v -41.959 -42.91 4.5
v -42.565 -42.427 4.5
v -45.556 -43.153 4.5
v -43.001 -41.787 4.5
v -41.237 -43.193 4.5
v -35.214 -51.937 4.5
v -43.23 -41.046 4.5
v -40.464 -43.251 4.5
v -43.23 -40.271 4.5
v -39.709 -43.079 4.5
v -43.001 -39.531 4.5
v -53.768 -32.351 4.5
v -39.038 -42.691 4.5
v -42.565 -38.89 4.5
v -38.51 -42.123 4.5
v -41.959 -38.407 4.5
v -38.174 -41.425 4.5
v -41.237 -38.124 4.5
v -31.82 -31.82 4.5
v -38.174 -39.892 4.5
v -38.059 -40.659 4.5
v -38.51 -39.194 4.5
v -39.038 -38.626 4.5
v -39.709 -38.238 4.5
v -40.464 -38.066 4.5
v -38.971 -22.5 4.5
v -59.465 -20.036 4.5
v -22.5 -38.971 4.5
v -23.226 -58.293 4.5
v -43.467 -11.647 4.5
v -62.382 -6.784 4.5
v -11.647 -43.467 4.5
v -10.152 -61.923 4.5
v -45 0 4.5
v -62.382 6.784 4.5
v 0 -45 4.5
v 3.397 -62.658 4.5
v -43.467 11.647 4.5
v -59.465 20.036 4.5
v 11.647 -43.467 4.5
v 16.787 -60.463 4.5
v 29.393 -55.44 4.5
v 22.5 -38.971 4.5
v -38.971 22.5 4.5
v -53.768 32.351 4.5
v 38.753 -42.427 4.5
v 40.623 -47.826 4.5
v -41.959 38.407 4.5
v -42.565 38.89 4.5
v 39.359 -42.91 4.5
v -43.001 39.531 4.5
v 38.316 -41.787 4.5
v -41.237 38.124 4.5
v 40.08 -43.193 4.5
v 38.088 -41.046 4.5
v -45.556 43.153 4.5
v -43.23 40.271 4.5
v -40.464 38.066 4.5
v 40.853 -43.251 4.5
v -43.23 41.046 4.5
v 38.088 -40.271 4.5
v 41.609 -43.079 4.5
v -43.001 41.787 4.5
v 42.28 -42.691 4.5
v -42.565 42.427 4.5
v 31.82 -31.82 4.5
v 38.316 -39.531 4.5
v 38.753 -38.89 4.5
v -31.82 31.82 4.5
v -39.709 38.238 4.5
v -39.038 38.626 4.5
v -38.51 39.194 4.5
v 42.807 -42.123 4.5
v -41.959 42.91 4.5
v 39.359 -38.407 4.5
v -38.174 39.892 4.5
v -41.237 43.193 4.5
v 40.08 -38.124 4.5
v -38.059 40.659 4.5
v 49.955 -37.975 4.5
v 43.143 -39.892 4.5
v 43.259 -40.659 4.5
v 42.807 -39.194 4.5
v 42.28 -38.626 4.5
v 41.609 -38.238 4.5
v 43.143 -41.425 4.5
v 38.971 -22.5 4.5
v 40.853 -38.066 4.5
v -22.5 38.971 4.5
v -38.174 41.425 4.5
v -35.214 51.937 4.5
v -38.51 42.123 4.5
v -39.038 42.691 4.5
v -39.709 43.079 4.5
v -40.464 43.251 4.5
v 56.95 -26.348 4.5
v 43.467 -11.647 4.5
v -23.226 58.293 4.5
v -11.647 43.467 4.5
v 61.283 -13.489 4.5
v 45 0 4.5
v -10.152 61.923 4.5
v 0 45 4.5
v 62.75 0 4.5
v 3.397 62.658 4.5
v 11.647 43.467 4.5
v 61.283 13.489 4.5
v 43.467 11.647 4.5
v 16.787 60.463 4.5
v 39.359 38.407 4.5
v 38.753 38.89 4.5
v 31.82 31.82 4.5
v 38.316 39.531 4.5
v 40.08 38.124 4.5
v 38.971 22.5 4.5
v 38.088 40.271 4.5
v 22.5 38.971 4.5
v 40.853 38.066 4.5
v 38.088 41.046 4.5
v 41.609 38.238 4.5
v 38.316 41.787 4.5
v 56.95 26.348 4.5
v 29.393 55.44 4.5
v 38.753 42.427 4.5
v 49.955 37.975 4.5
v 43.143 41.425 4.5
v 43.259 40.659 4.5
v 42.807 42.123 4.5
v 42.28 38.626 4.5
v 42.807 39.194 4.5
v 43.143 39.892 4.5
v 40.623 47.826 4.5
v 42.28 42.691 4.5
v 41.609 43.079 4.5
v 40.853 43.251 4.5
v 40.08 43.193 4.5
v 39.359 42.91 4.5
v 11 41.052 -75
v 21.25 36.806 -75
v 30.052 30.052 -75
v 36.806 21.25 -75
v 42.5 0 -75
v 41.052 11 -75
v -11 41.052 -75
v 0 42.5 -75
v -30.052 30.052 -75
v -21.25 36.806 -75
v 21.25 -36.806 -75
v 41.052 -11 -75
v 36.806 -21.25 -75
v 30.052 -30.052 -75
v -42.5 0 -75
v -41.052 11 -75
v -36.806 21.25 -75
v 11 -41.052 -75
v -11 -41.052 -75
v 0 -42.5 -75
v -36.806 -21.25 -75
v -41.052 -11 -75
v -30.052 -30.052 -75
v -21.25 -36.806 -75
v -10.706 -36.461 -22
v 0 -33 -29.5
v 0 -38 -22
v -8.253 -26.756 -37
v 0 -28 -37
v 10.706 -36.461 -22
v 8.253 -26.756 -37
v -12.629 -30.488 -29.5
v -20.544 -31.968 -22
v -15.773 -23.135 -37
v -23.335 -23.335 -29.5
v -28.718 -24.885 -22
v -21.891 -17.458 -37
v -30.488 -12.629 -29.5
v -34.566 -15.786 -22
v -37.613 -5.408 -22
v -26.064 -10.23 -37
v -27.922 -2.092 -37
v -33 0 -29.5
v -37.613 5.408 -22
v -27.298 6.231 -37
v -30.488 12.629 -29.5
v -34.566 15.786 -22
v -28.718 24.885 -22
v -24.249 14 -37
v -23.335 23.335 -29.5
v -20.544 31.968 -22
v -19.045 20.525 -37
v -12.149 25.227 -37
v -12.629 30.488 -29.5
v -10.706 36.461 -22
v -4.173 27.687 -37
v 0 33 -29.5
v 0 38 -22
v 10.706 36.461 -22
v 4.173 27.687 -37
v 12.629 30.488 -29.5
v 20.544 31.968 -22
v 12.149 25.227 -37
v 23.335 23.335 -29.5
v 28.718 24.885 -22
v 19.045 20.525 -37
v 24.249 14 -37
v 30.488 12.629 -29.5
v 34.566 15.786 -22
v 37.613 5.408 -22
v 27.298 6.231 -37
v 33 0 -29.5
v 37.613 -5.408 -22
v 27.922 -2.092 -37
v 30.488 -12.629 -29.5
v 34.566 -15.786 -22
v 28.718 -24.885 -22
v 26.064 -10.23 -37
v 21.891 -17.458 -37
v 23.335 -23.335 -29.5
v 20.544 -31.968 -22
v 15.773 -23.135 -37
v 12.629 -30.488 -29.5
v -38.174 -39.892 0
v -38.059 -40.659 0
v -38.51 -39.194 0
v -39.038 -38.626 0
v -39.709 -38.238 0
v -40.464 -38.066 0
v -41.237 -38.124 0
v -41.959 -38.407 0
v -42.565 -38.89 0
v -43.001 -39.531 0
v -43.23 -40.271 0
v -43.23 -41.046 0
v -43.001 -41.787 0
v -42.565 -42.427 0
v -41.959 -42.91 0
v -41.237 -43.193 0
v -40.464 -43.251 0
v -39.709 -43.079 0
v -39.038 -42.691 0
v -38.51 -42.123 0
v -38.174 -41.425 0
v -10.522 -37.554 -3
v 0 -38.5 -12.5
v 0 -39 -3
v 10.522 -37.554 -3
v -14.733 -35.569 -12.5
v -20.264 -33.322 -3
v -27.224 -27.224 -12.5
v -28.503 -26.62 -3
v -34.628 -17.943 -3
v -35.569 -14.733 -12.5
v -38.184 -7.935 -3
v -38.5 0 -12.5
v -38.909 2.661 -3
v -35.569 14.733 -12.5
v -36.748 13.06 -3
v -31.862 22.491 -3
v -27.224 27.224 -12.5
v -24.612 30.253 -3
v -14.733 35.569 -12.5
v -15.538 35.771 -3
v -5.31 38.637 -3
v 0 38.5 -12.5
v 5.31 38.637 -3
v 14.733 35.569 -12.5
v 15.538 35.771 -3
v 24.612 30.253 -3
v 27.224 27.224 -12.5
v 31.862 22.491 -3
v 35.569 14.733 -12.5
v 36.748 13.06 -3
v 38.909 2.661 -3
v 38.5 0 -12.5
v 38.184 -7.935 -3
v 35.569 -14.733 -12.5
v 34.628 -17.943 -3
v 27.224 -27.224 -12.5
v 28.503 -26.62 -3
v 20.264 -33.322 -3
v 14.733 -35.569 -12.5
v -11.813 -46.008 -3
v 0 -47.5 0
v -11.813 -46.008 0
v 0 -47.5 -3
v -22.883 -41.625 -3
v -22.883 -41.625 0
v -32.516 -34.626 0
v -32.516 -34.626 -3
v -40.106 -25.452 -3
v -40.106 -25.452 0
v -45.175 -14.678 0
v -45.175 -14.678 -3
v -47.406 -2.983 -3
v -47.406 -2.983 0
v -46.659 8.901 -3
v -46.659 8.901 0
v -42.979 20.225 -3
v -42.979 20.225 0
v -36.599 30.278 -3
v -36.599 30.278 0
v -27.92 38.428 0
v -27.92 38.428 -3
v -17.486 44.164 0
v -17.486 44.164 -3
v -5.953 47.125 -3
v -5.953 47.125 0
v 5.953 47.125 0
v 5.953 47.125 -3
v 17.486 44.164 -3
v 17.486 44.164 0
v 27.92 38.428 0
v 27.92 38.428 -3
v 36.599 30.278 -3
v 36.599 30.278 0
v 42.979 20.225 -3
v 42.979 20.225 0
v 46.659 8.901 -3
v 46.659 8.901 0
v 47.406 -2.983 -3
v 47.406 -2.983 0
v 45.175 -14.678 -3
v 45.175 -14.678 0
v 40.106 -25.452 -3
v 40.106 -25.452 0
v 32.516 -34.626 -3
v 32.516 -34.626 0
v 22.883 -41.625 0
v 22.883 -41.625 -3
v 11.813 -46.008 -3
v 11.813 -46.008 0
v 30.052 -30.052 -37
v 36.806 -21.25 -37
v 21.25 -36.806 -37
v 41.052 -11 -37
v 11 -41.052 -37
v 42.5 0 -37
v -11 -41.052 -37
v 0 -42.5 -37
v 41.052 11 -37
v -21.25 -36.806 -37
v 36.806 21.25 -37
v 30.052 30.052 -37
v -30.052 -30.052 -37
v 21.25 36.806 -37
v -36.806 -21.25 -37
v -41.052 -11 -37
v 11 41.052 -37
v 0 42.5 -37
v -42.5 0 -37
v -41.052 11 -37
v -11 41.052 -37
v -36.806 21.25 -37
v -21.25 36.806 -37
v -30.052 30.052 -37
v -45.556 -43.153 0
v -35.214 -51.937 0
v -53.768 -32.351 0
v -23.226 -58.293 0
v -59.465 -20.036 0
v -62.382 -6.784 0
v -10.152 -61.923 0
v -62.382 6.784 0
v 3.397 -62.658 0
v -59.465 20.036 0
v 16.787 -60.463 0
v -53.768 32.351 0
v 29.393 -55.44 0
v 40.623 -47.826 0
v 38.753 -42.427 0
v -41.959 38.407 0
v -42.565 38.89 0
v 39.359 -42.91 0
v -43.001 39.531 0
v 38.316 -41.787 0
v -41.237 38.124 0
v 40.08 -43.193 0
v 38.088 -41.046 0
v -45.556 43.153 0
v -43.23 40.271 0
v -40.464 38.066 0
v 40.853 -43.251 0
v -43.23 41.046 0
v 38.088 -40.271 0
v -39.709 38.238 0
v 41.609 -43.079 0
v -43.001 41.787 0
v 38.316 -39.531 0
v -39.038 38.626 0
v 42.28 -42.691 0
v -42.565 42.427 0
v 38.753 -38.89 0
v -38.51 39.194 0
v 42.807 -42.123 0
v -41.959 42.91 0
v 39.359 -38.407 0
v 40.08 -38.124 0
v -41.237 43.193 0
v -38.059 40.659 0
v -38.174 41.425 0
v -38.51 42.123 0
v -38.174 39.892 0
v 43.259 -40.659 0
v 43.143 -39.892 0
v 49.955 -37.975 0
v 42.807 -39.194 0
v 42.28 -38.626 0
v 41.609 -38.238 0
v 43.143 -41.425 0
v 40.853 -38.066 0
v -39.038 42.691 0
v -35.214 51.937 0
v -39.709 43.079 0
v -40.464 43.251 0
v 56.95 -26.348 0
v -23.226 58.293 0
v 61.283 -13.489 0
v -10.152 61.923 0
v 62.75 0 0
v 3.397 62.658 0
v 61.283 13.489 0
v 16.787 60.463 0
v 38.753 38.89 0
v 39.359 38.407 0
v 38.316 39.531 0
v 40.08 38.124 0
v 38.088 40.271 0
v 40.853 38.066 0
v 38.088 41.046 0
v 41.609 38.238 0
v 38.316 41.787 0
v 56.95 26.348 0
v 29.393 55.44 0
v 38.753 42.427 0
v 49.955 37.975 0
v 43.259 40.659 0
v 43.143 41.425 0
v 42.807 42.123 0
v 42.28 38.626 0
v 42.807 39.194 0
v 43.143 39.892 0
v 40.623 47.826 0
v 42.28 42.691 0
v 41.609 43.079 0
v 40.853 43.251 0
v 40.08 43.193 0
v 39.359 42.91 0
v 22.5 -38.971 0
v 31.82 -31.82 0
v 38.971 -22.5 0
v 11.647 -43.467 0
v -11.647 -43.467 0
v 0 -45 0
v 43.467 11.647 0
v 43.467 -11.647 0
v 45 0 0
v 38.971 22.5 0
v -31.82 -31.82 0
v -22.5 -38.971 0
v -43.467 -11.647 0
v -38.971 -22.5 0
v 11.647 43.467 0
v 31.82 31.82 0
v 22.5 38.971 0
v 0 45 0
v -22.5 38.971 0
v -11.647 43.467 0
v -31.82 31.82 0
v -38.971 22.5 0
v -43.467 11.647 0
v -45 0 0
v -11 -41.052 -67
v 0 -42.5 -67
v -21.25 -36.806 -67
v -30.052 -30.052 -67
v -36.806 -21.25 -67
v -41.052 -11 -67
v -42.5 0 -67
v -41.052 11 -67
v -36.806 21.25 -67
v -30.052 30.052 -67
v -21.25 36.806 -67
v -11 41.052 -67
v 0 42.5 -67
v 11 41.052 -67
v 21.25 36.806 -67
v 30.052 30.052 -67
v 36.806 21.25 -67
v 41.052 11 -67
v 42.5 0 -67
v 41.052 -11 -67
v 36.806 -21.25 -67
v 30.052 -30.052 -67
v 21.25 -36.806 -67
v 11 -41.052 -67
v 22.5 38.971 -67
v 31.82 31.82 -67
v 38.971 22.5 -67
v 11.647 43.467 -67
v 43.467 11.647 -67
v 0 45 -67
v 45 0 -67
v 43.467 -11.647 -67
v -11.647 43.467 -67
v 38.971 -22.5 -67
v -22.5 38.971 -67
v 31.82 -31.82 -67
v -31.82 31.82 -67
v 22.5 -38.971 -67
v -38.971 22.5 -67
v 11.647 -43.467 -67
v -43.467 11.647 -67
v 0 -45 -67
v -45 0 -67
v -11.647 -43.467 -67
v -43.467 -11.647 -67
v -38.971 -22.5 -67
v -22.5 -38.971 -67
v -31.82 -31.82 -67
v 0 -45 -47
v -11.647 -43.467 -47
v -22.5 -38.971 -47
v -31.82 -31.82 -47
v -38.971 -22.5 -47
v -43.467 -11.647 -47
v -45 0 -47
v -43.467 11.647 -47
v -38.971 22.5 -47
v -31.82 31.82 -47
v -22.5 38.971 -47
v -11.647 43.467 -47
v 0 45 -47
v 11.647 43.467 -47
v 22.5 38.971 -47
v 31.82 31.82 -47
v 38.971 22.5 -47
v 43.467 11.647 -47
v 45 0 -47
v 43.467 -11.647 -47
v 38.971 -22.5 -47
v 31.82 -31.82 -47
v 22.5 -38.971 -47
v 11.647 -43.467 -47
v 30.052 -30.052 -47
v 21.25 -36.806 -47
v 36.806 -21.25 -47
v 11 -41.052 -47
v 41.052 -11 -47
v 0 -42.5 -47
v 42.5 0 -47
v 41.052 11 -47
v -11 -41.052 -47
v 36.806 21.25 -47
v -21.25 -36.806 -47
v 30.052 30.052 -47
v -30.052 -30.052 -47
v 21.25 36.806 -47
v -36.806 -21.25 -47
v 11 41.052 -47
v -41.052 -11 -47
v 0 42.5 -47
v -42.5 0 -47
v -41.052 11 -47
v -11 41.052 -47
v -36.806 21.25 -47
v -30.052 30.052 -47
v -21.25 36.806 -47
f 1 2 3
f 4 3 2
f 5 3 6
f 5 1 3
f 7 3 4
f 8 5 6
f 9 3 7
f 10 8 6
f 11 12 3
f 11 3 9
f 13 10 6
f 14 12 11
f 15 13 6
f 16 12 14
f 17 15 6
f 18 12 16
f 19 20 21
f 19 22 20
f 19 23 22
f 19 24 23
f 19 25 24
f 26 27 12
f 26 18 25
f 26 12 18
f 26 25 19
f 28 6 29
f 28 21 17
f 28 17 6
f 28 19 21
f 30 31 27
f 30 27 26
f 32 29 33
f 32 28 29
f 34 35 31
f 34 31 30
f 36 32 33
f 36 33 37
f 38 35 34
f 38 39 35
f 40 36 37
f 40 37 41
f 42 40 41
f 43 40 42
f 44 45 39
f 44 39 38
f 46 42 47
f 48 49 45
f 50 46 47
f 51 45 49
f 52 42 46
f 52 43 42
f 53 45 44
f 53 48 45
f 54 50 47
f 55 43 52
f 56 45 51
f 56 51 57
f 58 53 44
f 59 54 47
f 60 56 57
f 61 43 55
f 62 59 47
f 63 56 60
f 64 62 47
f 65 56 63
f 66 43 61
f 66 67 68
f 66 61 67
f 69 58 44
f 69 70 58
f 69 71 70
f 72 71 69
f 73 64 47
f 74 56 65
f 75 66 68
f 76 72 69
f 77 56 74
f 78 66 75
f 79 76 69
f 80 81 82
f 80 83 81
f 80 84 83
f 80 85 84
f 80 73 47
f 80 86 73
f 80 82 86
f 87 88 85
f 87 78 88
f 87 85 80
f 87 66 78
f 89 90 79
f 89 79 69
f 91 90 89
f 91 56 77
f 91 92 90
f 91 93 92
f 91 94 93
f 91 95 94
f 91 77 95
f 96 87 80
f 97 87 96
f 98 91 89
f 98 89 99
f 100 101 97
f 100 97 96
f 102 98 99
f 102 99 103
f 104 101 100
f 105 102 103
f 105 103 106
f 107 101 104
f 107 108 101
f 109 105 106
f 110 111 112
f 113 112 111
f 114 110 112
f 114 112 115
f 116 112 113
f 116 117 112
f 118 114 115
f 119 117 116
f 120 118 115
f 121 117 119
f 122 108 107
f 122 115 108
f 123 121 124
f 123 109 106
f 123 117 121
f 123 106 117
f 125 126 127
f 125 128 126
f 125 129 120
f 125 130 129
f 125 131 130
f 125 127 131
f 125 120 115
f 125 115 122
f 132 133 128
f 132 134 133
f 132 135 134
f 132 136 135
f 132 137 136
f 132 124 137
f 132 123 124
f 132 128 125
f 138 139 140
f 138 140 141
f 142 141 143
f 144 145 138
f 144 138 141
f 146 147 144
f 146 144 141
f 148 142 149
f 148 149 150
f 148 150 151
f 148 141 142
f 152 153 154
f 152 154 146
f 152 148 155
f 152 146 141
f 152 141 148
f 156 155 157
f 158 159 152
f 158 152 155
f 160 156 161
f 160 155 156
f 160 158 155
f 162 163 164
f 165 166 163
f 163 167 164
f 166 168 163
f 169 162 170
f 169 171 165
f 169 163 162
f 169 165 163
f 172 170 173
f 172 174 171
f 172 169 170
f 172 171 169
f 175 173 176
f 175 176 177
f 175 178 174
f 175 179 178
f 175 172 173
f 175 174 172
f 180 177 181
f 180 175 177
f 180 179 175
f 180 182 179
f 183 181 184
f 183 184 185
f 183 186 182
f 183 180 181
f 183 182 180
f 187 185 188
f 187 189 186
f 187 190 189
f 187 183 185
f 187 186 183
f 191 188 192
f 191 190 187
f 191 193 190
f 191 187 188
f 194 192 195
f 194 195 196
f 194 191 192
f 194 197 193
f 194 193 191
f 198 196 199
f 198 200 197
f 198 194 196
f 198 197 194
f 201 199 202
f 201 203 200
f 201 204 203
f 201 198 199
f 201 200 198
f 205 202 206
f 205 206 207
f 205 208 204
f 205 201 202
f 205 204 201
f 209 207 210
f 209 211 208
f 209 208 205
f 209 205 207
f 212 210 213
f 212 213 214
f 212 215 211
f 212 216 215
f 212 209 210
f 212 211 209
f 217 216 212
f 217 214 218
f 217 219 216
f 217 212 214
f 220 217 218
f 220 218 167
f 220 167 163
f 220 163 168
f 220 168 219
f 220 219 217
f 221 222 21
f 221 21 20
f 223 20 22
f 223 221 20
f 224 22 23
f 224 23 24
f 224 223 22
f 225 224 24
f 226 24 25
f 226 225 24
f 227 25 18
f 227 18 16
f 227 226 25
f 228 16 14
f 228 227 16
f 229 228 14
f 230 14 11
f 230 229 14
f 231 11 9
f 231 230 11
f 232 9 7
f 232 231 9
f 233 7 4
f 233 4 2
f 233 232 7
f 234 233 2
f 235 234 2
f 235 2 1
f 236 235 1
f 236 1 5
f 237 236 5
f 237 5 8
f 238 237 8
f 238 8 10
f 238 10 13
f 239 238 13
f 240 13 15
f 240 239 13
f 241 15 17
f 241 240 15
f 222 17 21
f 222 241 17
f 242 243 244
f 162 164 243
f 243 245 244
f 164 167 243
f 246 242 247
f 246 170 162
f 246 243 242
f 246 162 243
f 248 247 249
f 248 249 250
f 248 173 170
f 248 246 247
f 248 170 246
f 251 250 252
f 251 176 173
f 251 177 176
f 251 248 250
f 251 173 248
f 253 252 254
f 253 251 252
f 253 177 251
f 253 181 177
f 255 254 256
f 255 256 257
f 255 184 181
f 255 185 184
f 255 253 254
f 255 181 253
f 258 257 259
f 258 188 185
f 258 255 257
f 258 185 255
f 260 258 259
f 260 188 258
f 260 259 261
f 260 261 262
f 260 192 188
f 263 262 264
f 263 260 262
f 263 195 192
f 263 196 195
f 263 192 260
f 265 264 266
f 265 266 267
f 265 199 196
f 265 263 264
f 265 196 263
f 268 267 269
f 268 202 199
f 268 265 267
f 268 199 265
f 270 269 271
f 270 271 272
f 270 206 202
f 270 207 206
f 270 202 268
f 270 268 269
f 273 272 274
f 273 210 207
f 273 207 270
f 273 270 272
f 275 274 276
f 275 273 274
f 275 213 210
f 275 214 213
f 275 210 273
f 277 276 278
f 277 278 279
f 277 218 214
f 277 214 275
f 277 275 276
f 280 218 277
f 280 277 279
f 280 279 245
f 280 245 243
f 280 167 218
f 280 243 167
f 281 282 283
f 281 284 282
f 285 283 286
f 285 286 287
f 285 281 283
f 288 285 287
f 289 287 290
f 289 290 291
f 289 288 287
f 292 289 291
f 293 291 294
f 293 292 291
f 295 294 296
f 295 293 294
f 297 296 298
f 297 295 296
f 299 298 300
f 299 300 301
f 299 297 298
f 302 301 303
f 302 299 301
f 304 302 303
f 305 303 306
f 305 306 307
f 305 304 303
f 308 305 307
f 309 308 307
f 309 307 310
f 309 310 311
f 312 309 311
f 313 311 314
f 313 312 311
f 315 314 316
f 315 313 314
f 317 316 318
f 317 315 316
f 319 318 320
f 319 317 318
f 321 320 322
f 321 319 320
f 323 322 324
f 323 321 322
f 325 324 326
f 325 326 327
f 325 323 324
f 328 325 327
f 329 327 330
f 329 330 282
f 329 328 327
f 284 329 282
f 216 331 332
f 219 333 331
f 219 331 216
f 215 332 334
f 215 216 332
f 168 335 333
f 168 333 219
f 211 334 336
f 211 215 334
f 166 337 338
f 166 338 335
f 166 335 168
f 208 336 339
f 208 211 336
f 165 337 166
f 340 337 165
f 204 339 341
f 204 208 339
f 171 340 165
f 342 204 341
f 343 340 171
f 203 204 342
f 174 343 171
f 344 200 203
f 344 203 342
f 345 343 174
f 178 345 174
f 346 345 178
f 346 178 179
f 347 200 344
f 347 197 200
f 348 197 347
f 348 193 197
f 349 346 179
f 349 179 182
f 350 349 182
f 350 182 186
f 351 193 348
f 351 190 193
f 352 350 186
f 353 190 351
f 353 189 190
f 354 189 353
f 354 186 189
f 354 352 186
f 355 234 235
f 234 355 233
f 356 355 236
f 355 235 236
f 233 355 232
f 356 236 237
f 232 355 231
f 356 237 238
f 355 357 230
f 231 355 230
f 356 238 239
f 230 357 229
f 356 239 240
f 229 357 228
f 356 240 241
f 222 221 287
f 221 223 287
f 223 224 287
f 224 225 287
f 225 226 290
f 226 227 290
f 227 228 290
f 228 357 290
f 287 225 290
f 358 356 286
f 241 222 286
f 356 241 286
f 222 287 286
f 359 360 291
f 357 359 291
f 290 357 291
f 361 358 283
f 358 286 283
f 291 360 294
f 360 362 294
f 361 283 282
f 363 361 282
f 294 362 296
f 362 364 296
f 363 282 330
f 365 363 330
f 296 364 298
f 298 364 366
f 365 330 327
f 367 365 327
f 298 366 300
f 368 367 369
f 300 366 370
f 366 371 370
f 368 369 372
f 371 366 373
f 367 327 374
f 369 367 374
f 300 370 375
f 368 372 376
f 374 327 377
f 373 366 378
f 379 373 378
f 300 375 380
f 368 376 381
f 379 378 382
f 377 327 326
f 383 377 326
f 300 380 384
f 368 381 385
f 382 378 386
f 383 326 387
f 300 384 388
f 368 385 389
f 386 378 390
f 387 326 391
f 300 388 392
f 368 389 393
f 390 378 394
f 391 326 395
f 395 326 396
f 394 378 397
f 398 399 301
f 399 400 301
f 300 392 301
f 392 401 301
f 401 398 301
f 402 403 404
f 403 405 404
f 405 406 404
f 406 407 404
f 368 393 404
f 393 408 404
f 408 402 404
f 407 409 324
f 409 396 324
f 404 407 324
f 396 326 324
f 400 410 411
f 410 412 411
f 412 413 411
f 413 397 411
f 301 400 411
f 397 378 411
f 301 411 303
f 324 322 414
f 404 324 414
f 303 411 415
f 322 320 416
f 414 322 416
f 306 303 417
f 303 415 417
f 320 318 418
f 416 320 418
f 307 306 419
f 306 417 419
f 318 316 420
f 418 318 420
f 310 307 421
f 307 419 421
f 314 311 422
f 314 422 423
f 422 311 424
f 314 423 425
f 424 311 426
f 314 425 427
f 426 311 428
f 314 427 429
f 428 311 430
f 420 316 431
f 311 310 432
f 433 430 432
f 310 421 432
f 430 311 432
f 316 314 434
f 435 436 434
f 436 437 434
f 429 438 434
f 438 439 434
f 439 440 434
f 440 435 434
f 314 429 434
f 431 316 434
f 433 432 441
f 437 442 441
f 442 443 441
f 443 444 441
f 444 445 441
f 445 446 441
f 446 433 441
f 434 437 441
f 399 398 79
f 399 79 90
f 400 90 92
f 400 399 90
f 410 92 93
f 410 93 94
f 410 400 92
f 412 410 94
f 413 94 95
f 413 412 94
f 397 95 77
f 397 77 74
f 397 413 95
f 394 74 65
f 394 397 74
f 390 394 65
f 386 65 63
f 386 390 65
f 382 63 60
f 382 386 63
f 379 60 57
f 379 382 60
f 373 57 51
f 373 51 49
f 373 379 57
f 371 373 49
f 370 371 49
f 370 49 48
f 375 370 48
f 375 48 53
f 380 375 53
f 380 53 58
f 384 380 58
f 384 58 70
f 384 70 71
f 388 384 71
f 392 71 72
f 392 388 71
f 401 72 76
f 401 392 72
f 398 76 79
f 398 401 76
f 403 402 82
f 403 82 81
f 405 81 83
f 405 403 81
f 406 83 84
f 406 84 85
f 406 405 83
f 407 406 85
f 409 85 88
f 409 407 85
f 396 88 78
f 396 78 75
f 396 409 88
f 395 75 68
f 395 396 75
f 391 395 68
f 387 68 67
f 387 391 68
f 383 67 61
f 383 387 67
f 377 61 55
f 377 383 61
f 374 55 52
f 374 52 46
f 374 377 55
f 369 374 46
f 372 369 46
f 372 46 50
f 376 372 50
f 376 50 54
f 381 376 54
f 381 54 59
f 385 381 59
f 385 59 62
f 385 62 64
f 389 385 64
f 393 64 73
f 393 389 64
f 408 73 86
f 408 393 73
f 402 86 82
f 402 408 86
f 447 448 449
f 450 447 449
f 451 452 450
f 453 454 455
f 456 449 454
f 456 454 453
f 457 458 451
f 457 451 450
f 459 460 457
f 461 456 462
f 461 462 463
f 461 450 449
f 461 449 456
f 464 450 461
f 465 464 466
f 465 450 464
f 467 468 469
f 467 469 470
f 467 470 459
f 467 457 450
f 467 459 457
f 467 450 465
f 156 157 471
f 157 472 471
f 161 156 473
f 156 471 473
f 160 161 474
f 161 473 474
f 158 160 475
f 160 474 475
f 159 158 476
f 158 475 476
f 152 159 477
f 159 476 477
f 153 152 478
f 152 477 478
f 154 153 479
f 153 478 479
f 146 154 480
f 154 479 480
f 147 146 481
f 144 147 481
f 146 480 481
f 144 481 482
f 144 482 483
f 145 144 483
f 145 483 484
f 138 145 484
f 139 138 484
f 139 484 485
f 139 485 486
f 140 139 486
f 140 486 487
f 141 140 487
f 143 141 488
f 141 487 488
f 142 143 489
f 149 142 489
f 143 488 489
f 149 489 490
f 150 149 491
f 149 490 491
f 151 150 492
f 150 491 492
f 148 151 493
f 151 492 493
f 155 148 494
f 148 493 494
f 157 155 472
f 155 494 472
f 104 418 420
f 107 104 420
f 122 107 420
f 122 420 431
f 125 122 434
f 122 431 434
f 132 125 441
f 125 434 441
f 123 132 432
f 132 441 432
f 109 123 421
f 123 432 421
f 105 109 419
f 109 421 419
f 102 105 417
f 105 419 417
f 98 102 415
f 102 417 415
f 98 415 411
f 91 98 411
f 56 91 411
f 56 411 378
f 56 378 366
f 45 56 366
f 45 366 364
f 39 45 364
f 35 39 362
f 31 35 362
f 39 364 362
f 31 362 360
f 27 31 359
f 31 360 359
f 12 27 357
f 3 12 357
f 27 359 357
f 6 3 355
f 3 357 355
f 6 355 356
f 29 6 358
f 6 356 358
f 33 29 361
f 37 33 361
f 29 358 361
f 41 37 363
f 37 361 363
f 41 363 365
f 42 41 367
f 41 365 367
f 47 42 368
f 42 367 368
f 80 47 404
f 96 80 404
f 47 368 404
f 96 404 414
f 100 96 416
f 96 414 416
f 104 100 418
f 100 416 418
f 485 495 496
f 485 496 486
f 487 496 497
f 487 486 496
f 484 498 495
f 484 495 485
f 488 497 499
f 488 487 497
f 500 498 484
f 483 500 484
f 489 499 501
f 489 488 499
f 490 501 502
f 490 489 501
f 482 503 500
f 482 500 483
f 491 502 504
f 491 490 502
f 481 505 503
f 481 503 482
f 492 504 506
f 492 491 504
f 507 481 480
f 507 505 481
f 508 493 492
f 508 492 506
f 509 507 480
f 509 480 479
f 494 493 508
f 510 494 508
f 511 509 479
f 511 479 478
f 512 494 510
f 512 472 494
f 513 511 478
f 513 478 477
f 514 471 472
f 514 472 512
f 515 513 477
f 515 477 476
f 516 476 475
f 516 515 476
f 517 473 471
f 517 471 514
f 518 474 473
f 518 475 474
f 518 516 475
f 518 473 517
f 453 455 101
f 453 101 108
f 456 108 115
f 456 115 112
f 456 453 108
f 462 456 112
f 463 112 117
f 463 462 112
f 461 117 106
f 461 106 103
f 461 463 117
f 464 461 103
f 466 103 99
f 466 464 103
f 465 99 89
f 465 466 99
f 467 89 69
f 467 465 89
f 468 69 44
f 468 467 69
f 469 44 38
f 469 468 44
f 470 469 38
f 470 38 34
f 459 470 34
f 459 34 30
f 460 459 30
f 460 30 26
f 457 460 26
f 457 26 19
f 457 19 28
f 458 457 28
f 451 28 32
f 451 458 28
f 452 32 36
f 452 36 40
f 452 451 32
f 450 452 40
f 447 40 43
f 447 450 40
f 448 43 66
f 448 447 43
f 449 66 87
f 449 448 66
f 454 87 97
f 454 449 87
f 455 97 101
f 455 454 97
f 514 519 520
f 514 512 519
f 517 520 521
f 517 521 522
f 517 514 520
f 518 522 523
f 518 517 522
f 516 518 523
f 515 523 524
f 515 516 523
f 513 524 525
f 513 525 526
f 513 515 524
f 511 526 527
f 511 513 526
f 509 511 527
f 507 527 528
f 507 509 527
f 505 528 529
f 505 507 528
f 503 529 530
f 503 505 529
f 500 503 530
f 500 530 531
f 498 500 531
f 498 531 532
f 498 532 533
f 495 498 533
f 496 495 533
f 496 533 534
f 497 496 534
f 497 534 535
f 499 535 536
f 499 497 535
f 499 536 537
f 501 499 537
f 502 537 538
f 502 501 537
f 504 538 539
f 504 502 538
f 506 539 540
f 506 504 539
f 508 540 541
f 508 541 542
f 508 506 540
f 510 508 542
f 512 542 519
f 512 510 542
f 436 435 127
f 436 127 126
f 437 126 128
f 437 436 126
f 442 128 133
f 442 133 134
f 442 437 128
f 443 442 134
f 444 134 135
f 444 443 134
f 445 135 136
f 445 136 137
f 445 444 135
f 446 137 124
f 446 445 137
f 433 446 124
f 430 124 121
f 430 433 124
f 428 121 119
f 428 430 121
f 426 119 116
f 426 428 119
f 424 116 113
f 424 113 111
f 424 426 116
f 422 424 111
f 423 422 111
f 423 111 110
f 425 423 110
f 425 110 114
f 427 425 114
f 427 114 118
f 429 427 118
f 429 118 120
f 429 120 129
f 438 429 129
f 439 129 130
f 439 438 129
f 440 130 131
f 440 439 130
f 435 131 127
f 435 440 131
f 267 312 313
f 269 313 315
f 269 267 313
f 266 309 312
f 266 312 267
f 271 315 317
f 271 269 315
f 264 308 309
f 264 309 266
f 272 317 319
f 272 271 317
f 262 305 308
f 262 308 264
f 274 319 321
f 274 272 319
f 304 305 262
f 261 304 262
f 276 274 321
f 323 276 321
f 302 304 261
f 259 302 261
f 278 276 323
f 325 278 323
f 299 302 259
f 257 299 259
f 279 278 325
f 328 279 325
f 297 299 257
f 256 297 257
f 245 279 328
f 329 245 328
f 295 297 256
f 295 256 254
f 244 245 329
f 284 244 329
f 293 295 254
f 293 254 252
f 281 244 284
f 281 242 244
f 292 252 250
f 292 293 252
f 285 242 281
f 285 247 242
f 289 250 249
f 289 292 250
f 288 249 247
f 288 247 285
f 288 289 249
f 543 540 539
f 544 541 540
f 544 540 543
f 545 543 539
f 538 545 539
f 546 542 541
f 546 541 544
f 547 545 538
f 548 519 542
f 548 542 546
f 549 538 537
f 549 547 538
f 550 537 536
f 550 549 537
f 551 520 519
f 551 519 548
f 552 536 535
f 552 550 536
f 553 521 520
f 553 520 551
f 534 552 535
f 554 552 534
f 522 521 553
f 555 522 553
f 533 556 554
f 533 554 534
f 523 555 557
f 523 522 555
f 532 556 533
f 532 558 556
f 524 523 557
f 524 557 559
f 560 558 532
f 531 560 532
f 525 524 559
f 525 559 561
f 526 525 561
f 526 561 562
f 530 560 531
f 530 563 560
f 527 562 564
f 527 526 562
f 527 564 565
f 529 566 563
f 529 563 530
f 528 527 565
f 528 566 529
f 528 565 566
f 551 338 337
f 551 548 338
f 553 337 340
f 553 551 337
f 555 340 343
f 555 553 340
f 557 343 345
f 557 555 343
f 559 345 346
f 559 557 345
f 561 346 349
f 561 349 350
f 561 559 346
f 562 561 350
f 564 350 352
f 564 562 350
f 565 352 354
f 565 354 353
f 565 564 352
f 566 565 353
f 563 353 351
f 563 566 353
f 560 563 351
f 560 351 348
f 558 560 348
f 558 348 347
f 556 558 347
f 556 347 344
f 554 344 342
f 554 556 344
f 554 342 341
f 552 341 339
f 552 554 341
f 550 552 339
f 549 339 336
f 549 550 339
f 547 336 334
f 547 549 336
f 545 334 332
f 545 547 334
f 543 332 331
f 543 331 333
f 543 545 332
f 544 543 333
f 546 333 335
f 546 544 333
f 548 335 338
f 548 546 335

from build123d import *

# Parameters (mm, degrees)
F0_W     = 42.5
F0_H     = 8
F1_R     = 62.75
F1_R_2   = 2.6
F1_R_3   = 45
F3_DEPTH = 4.5


with BuildPart() as f2:
    # F0 (on Right) → F2 (revolve)
    with BuildSketch(Plane.YZ):
        Polygon((0, -37), (0, 0), (-47.5, 0), (-47.5, -3), (-39, -3), (-38, -22), (-28, -37), align=None)
        Polygon((0, -47), (0, -37), (-28, -37), (-42.5, -37), (-42.5, -47), align=None)
        Polygon((0, -67), (0, -47), (-42.5, -47), (-45, -47), (-45, -67), (-42.5, -67), align=None)
        with Locations((-21.25, -71)):
            Rectangle(F0_W, F0_H)
    revolve(axis=Axis((0, 0, -38.677778095), (0, 0, -1)))

    # F1 (on Top) → F3 (join)
    with BuildSketch(Plane.XY):
        Circle(F1_R)
        with Locations((-40.6586399182, -40.6586399182)):
            Circle(F1_R_2, mode=Mode.SUBTRACT)
        with Locations((40.6586399182, -40.6586399182)):
            Circle(F1_R_2, mode=Mode.SUBTRACT)
        with Locations((-40.6586399182, 40.6586399182)):
            Circle(F1_R_2, mode=Mode.SUBTRACT)
        Circle(F1_R_3, mode=Mode.SUBTRACT)
        with Locations((40.6586399182, 40.6586399182)):
            Circle(F1_R_2, mode=Mode.SUBTRACT)
    extrude(amount=F3_DEPTH)


solid = f2.part
